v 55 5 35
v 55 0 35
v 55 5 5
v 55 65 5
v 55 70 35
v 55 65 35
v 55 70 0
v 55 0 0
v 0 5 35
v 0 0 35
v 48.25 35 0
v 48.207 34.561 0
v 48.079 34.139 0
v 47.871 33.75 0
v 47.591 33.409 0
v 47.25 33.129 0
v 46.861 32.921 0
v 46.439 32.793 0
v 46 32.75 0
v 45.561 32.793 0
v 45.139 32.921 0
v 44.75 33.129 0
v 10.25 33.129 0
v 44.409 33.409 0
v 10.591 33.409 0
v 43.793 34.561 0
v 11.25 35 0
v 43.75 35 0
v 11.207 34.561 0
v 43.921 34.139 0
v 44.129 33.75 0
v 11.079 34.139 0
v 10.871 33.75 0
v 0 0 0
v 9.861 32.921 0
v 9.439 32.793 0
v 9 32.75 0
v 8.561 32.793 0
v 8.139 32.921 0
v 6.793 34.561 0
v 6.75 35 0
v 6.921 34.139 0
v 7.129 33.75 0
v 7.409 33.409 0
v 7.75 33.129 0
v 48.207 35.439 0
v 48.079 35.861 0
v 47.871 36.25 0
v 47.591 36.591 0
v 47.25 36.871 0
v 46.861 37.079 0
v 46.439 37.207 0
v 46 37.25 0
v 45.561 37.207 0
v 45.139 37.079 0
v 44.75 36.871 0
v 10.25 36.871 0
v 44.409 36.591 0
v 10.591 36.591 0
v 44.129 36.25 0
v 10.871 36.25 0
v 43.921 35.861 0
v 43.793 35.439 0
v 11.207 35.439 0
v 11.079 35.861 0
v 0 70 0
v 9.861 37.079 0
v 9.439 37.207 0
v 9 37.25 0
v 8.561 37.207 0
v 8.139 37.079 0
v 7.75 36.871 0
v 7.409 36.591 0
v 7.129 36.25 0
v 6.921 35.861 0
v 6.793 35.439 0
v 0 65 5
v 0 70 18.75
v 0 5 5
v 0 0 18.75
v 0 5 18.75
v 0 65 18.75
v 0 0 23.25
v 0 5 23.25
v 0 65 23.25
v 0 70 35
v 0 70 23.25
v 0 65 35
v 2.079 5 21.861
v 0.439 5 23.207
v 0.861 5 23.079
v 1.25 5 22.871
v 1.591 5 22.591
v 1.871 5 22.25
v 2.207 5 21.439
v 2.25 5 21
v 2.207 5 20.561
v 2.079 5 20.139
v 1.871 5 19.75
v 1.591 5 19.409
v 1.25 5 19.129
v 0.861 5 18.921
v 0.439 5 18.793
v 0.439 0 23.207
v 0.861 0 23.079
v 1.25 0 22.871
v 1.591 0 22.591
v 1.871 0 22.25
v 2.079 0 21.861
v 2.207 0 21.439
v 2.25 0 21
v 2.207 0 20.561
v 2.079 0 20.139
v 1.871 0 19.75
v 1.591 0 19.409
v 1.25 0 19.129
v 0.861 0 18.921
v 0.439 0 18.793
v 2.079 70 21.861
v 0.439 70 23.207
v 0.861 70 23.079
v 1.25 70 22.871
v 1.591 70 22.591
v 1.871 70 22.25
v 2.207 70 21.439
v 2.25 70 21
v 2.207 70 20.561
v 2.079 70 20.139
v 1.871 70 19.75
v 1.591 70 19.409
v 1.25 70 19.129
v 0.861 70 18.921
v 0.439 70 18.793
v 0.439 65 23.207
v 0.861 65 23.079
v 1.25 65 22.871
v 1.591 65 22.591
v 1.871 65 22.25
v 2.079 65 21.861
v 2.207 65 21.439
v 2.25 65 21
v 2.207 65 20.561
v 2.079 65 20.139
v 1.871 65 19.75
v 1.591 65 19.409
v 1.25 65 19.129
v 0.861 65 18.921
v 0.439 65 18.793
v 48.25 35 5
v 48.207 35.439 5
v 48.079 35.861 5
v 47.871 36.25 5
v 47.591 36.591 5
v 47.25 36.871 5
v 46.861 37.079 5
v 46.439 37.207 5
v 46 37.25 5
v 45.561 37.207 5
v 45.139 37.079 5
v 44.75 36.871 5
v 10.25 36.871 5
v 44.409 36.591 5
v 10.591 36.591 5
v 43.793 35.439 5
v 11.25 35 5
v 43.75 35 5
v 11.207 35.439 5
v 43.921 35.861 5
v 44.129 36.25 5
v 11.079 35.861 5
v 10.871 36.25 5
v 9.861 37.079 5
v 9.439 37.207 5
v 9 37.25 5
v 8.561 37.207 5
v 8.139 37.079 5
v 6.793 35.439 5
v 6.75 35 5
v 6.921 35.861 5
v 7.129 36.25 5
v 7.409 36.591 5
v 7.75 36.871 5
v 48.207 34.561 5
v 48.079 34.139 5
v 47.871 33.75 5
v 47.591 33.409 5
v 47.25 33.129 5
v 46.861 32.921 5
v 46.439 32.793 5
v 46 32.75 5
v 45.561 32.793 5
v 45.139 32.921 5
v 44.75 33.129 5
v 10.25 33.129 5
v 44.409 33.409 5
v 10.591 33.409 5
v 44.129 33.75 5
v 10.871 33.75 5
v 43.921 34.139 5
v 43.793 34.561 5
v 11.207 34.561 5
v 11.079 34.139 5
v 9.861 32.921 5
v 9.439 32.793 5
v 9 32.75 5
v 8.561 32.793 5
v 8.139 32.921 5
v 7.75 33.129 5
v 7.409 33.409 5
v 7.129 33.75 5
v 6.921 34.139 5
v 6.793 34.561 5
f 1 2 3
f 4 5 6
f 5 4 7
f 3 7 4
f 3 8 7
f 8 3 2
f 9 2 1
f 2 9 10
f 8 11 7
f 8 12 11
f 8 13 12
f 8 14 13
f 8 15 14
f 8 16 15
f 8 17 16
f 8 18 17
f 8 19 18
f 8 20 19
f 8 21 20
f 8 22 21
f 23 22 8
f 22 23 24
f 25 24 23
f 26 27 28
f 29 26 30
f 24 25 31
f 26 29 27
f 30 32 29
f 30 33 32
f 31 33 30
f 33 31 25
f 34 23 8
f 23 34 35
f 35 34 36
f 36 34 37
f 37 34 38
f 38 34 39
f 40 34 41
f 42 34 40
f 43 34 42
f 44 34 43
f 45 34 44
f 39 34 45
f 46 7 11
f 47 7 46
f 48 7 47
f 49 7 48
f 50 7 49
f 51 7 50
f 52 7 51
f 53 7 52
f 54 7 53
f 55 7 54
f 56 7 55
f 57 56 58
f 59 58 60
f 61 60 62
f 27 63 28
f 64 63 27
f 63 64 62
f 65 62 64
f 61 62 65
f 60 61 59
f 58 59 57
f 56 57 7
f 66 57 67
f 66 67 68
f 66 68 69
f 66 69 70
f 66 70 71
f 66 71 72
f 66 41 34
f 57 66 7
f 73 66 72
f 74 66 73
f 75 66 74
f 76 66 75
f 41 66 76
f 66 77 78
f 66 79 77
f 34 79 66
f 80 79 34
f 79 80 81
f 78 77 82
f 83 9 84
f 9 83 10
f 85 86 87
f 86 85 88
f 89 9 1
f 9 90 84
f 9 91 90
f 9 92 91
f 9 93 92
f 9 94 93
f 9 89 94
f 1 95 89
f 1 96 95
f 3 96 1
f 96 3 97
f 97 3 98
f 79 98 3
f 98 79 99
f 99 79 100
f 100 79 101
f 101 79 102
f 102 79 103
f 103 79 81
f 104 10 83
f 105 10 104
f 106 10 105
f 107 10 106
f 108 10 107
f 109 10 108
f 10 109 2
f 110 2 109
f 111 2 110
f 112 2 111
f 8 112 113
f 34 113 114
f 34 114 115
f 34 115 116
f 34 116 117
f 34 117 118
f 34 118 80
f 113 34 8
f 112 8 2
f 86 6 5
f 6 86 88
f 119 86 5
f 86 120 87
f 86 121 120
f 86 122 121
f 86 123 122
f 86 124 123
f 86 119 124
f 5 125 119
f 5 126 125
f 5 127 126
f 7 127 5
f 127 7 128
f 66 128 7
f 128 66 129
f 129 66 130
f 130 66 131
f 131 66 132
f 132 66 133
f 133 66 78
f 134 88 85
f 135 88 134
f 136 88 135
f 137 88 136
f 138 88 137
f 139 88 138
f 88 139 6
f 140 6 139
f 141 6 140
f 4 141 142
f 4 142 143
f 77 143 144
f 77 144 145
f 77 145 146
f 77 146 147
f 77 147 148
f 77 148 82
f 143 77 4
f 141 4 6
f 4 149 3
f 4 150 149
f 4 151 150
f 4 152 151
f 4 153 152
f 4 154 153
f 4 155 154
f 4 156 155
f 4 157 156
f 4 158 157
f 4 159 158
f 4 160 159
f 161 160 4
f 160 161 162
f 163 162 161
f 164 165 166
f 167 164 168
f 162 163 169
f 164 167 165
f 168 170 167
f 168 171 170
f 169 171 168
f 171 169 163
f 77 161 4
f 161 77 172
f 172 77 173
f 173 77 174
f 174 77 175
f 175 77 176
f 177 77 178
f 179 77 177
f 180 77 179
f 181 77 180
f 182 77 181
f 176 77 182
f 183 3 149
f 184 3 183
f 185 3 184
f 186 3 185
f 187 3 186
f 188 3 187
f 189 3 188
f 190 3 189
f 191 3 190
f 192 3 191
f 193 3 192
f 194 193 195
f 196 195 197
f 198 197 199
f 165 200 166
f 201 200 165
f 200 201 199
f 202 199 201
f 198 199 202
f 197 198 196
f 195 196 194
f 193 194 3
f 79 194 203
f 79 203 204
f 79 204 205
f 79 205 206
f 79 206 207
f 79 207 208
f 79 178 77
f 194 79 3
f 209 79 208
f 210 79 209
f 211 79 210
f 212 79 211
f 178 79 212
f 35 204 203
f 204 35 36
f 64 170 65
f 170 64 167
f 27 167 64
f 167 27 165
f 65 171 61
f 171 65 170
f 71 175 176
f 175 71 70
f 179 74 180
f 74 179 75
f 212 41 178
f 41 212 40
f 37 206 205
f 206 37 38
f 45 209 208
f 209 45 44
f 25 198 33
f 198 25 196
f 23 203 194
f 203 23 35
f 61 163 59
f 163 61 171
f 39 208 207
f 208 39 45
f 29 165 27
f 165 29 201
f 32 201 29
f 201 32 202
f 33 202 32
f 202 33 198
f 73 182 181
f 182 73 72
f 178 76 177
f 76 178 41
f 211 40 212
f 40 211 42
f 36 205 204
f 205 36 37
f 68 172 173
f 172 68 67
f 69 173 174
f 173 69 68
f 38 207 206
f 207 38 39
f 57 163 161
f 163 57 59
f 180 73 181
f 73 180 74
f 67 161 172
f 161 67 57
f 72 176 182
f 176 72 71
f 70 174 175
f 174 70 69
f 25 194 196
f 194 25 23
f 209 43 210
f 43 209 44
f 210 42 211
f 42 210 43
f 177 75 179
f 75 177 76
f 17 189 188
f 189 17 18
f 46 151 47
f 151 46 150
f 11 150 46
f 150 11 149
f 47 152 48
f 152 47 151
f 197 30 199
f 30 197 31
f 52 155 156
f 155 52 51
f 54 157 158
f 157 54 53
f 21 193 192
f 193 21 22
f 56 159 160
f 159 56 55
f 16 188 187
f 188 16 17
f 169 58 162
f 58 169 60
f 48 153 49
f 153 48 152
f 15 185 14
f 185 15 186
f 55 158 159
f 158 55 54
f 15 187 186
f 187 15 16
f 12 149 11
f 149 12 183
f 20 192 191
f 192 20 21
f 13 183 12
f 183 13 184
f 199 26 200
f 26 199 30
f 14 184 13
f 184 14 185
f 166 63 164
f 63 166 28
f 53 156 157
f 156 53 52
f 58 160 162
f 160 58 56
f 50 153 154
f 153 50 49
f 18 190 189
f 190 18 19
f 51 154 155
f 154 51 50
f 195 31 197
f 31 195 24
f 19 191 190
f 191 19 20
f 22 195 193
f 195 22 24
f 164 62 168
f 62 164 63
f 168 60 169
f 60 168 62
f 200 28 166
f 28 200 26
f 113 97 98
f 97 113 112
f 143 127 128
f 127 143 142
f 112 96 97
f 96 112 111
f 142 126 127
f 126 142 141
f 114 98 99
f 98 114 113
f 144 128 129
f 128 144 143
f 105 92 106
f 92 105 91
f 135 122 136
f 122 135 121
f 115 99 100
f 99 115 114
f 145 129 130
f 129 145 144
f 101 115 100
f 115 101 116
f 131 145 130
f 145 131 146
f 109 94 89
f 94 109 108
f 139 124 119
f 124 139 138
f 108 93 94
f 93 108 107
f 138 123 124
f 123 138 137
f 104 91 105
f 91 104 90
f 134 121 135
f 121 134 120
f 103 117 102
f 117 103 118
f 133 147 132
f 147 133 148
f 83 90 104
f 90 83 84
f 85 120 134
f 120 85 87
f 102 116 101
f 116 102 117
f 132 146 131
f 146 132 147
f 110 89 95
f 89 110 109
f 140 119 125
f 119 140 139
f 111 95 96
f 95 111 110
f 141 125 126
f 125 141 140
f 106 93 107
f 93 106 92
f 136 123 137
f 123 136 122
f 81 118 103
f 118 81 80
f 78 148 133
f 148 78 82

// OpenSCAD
$fn = 32;

// ----------------------------------------------------------------------
// U-bracket: 55 x 70 x 35 mm
// ----------------------------------------------------------------------

// --- parameters (mm) ---
span = 55;                // outer length, X
outer_w = 70;             // outer width, Y
wall_h = 35;              // upright height, Z
plate_t = 5;              // wall thickness
hole_d = 4.5;             // clearance for M4

module hole_z(px, py) {
  translate([px, py, -0.5]) cylinder(h = plate_t + 1, d = hole_d);
}
module hole_y_pz(pz) {
  /* through both uprights along Y */
  translate([0, -0.5, pz]) rotate([-90, 0, 0]) cylinder(h = outer_w + 1, d = hole_d);
}

module base() {
  cube([span, outer_w, plate_t]);
}

module uprights() {
  cube([span, plate_t, wall_h]);
  translate([0, outer_w - plate_t, 0]) cube([span, plate_t, wall_h]);
}

difference() {
  union() {
    base();
    uprights();
  }
  hole_z(9, 35);
  hole_z(46, 35);
  hole_y_pz(21);
}
